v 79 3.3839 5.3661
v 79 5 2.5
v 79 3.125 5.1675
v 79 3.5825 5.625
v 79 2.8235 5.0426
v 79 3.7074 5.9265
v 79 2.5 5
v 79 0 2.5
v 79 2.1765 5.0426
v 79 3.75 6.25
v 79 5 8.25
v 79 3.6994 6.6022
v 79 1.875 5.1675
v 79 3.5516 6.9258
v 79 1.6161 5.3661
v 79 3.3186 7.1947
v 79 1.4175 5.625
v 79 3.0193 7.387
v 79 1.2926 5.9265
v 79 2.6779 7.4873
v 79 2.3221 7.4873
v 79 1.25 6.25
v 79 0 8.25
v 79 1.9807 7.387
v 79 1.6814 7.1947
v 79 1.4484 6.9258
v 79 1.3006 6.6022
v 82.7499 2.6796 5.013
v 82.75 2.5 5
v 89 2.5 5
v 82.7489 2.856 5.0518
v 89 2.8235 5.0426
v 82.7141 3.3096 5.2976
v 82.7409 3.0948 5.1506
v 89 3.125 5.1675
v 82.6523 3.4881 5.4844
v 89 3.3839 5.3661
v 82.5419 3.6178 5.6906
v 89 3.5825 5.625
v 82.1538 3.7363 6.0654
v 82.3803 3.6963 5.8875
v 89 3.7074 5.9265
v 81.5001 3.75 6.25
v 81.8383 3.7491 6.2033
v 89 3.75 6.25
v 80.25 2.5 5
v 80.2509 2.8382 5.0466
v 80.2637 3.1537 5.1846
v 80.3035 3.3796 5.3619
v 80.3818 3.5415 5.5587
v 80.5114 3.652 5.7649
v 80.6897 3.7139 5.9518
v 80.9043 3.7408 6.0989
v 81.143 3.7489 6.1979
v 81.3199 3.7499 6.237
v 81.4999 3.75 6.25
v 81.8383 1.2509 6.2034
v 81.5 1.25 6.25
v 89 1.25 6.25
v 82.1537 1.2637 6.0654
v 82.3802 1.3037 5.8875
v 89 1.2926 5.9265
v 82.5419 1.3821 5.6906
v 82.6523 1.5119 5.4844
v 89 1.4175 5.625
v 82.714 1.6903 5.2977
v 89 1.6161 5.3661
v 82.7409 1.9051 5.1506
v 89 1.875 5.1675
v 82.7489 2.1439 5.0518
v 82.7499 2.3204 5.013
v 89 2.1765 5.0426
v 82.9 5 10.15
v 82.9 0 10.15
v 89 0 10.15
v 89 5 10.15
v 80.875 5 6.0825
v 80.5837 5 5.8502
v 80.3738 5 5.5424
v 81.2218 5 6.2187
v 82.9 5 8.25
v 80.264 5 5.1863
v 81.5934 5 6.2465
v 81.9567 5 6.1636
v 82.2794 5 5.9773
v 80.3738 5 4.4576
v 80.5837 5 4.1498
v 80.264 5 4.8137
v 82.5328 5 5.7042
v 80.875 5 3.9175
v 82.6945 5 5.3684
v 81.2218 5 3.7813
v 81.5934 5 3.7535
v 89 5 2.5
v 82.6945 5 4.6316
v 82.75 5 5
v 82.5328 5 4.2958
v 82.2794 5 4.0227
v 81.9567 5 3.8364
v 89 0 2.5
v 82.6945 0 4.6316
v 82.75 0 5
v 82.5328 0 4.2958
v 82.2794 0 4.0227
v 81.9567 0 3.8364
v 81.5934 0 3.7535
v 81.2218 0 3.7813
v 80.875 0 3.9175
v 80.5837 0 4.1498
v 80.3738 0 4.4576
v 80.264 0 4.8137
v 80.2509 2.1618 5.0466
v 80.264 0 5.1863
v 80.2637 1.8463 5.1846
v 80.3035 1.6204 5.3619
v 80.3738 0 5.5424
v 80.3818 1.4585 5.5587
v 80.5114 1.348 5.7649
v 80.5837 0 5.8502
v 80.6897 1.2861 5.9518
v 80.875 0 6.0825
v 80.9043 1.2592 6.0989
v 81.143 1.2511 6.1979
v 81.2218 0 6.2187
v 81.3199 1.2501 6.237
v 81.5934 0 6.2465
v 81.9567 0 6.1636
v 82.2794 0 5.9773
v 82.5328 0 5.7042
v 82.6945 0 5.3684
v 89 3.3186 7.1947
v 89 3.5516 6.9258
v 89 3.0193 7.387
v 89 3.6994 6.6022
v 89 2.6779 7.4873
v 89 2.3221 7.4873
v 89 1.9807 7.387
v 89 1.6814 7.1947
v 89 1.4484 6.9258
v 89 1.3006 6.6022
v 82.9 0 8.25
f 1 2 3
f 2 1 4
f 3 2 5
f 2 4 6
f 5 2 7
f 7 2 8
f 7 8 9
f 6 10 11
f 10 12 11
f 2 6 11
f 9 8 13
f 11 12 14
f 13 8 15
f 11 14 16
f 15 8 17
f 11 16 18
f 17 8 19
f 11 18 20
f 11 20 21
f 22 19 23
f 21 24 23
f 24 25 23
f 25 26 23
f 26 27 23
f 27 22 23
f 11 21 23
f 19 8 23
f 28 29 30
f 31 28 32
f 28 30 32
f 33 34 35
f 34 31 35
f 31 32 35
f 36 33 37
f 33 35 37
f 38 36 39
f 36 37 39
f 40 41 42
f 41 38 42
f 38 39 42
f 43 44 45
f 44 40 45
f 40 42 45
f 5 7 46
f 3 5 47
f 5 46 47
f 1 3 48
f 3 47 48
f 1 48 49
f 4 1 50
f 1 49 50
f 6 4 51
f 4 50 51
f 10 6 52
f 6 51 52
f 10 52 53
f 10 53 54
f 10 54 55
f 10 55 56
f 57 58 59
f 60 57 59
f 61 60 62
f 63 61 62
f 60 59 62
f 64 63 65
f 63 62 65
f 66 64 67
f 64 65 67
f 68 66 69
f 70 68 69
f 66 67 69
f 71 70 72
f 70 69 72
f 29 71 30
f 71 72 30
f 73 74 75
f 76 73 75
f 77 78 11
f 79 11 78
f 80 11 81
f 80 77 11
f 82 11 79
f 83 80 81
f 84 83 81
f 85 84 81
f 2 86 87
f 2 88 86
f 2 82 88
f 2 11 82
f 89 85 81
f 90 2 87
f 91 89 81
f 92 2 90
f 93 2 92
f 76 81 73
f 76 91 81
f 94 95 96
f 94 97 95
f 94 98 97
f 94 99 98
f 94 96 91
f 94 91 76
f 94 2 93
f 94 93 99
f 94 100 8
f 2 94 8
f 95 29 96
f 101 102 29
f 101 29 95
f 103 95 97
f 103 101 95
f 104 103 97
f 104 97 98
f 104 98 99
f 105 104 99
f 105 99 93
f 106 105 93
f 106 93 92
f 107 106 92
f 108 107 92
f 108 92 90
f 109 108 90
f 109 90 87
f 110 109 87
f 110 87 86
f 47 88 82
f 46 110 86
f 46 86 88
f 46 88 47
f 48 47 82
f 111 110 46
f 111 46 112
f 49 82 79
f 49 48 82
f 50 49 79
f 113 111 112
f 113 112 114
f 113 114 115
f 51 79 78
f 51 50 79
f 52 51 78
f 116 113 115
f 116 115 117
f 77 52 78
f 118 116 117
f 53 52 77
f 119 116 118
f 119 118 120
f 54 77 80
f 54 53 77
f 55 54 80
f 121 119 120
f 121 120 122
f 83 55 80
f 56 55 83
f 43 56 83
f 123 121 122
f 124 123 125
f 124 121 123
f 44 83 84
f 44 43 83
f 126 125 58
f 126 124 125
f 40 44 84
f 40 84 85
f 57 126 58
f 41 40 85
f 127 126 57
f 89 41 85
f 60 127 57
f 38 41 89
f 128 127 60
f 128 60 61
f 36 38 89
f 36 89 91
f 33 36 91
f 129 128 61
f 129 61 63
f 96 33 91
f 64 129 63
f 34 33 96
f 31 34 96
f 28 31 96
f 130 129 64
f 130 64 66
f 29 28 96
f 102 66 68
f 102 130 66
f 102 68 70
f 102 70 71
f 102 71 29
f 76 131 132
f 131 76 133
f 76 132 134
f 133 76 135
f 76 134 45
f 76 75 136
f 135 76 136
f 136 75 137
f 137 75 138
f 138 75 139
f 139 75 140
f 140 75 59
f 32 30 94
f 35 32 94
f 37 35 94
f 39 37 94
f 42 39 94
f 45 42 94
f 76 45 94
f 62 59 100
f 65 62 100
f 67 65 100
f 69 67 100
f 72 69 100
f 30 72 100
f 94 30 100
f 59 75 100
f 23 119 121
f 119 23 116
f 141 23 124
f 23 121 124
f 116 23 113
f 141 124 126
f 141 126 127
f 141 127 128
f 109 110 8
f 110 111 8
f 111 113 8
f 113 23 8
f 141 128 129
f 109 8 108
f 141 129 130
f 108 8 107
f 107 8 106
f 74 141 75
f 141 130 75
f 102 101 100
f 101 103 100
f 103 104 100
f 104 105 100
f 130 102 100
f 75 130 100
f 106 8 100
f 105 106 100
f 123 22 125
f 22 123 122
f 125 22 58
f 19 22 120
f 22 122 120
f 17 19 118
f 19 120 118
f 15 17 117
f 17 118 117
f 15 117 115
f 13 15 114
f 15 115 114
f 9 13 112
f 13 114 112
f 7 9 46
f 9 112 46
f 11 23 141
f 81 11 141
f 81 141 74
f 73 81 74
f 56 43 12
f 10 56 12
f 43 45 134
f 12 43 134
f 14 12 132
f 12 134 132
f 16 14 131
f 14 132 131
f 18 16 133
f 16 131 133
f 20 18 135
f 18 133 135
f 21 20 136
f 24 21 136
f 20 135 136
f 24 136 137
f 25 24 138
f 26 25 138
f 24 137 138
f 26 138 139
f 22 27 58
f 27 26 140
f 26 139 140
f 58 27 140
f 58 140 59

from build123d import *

# Parameters (mm, degrees)
SKETCH4_R           = 1.25
BOSS_EXTRUDE1_DEPTH = 5
CUT_EXTRUDE1_DEPTH  = 10


with BuildPart() as part:
    # Sketch4 → Boss-Extrude1 (new body)
    with BuildSketch(Plane(origin=(0, 0, 0), x_dir=(1, 0, 0), z_dir=(0, 1, 0))):
        Polygon((79, -2.5), (79, -5), (79, -7.5), (79, -8.25), (82.9, -8.25), (82.9, -10.15), (89, -10.15), (89, -2.5), align=None)
        with Locations((81.5, -5)):
            Circle(SKETCH4_R, mode=Mode.SUBTRACT)
    extrude(amount=BOSS_EXTRUDE1_DEPTH)

    # Sketch5 → Cut-Extrude1 (cut)
    with BuildSketch(Plane(origin=(89, 0, 0), x_dir=(0, 0, -1), z_dir=(1, 0, 0))):
        with BuildLine():
            ThreePointArc((-5, 2.5), (-5.366116524, 3.383883476), (-6.25, 3.75))
            Line((-6.25, 3.75), (-6.25, 1.25))
            ThreePointArc((-6.25, 1.25), (-5.366116524, 1.616116524), (-5, 2.5))
        make_face()
        with BuildLine():
            Line((-6.25, 1.25), (-6.25, 3.75))
            ThreePointArc((-6.25, 3.75), (-7.5, 2.5), (-6.25, 1.25))
        make_face()
    extrude(amount=-CUT_EXTRUDE1_DEPTH, mode=Mode.SUBTRACT)


solid = part.part
